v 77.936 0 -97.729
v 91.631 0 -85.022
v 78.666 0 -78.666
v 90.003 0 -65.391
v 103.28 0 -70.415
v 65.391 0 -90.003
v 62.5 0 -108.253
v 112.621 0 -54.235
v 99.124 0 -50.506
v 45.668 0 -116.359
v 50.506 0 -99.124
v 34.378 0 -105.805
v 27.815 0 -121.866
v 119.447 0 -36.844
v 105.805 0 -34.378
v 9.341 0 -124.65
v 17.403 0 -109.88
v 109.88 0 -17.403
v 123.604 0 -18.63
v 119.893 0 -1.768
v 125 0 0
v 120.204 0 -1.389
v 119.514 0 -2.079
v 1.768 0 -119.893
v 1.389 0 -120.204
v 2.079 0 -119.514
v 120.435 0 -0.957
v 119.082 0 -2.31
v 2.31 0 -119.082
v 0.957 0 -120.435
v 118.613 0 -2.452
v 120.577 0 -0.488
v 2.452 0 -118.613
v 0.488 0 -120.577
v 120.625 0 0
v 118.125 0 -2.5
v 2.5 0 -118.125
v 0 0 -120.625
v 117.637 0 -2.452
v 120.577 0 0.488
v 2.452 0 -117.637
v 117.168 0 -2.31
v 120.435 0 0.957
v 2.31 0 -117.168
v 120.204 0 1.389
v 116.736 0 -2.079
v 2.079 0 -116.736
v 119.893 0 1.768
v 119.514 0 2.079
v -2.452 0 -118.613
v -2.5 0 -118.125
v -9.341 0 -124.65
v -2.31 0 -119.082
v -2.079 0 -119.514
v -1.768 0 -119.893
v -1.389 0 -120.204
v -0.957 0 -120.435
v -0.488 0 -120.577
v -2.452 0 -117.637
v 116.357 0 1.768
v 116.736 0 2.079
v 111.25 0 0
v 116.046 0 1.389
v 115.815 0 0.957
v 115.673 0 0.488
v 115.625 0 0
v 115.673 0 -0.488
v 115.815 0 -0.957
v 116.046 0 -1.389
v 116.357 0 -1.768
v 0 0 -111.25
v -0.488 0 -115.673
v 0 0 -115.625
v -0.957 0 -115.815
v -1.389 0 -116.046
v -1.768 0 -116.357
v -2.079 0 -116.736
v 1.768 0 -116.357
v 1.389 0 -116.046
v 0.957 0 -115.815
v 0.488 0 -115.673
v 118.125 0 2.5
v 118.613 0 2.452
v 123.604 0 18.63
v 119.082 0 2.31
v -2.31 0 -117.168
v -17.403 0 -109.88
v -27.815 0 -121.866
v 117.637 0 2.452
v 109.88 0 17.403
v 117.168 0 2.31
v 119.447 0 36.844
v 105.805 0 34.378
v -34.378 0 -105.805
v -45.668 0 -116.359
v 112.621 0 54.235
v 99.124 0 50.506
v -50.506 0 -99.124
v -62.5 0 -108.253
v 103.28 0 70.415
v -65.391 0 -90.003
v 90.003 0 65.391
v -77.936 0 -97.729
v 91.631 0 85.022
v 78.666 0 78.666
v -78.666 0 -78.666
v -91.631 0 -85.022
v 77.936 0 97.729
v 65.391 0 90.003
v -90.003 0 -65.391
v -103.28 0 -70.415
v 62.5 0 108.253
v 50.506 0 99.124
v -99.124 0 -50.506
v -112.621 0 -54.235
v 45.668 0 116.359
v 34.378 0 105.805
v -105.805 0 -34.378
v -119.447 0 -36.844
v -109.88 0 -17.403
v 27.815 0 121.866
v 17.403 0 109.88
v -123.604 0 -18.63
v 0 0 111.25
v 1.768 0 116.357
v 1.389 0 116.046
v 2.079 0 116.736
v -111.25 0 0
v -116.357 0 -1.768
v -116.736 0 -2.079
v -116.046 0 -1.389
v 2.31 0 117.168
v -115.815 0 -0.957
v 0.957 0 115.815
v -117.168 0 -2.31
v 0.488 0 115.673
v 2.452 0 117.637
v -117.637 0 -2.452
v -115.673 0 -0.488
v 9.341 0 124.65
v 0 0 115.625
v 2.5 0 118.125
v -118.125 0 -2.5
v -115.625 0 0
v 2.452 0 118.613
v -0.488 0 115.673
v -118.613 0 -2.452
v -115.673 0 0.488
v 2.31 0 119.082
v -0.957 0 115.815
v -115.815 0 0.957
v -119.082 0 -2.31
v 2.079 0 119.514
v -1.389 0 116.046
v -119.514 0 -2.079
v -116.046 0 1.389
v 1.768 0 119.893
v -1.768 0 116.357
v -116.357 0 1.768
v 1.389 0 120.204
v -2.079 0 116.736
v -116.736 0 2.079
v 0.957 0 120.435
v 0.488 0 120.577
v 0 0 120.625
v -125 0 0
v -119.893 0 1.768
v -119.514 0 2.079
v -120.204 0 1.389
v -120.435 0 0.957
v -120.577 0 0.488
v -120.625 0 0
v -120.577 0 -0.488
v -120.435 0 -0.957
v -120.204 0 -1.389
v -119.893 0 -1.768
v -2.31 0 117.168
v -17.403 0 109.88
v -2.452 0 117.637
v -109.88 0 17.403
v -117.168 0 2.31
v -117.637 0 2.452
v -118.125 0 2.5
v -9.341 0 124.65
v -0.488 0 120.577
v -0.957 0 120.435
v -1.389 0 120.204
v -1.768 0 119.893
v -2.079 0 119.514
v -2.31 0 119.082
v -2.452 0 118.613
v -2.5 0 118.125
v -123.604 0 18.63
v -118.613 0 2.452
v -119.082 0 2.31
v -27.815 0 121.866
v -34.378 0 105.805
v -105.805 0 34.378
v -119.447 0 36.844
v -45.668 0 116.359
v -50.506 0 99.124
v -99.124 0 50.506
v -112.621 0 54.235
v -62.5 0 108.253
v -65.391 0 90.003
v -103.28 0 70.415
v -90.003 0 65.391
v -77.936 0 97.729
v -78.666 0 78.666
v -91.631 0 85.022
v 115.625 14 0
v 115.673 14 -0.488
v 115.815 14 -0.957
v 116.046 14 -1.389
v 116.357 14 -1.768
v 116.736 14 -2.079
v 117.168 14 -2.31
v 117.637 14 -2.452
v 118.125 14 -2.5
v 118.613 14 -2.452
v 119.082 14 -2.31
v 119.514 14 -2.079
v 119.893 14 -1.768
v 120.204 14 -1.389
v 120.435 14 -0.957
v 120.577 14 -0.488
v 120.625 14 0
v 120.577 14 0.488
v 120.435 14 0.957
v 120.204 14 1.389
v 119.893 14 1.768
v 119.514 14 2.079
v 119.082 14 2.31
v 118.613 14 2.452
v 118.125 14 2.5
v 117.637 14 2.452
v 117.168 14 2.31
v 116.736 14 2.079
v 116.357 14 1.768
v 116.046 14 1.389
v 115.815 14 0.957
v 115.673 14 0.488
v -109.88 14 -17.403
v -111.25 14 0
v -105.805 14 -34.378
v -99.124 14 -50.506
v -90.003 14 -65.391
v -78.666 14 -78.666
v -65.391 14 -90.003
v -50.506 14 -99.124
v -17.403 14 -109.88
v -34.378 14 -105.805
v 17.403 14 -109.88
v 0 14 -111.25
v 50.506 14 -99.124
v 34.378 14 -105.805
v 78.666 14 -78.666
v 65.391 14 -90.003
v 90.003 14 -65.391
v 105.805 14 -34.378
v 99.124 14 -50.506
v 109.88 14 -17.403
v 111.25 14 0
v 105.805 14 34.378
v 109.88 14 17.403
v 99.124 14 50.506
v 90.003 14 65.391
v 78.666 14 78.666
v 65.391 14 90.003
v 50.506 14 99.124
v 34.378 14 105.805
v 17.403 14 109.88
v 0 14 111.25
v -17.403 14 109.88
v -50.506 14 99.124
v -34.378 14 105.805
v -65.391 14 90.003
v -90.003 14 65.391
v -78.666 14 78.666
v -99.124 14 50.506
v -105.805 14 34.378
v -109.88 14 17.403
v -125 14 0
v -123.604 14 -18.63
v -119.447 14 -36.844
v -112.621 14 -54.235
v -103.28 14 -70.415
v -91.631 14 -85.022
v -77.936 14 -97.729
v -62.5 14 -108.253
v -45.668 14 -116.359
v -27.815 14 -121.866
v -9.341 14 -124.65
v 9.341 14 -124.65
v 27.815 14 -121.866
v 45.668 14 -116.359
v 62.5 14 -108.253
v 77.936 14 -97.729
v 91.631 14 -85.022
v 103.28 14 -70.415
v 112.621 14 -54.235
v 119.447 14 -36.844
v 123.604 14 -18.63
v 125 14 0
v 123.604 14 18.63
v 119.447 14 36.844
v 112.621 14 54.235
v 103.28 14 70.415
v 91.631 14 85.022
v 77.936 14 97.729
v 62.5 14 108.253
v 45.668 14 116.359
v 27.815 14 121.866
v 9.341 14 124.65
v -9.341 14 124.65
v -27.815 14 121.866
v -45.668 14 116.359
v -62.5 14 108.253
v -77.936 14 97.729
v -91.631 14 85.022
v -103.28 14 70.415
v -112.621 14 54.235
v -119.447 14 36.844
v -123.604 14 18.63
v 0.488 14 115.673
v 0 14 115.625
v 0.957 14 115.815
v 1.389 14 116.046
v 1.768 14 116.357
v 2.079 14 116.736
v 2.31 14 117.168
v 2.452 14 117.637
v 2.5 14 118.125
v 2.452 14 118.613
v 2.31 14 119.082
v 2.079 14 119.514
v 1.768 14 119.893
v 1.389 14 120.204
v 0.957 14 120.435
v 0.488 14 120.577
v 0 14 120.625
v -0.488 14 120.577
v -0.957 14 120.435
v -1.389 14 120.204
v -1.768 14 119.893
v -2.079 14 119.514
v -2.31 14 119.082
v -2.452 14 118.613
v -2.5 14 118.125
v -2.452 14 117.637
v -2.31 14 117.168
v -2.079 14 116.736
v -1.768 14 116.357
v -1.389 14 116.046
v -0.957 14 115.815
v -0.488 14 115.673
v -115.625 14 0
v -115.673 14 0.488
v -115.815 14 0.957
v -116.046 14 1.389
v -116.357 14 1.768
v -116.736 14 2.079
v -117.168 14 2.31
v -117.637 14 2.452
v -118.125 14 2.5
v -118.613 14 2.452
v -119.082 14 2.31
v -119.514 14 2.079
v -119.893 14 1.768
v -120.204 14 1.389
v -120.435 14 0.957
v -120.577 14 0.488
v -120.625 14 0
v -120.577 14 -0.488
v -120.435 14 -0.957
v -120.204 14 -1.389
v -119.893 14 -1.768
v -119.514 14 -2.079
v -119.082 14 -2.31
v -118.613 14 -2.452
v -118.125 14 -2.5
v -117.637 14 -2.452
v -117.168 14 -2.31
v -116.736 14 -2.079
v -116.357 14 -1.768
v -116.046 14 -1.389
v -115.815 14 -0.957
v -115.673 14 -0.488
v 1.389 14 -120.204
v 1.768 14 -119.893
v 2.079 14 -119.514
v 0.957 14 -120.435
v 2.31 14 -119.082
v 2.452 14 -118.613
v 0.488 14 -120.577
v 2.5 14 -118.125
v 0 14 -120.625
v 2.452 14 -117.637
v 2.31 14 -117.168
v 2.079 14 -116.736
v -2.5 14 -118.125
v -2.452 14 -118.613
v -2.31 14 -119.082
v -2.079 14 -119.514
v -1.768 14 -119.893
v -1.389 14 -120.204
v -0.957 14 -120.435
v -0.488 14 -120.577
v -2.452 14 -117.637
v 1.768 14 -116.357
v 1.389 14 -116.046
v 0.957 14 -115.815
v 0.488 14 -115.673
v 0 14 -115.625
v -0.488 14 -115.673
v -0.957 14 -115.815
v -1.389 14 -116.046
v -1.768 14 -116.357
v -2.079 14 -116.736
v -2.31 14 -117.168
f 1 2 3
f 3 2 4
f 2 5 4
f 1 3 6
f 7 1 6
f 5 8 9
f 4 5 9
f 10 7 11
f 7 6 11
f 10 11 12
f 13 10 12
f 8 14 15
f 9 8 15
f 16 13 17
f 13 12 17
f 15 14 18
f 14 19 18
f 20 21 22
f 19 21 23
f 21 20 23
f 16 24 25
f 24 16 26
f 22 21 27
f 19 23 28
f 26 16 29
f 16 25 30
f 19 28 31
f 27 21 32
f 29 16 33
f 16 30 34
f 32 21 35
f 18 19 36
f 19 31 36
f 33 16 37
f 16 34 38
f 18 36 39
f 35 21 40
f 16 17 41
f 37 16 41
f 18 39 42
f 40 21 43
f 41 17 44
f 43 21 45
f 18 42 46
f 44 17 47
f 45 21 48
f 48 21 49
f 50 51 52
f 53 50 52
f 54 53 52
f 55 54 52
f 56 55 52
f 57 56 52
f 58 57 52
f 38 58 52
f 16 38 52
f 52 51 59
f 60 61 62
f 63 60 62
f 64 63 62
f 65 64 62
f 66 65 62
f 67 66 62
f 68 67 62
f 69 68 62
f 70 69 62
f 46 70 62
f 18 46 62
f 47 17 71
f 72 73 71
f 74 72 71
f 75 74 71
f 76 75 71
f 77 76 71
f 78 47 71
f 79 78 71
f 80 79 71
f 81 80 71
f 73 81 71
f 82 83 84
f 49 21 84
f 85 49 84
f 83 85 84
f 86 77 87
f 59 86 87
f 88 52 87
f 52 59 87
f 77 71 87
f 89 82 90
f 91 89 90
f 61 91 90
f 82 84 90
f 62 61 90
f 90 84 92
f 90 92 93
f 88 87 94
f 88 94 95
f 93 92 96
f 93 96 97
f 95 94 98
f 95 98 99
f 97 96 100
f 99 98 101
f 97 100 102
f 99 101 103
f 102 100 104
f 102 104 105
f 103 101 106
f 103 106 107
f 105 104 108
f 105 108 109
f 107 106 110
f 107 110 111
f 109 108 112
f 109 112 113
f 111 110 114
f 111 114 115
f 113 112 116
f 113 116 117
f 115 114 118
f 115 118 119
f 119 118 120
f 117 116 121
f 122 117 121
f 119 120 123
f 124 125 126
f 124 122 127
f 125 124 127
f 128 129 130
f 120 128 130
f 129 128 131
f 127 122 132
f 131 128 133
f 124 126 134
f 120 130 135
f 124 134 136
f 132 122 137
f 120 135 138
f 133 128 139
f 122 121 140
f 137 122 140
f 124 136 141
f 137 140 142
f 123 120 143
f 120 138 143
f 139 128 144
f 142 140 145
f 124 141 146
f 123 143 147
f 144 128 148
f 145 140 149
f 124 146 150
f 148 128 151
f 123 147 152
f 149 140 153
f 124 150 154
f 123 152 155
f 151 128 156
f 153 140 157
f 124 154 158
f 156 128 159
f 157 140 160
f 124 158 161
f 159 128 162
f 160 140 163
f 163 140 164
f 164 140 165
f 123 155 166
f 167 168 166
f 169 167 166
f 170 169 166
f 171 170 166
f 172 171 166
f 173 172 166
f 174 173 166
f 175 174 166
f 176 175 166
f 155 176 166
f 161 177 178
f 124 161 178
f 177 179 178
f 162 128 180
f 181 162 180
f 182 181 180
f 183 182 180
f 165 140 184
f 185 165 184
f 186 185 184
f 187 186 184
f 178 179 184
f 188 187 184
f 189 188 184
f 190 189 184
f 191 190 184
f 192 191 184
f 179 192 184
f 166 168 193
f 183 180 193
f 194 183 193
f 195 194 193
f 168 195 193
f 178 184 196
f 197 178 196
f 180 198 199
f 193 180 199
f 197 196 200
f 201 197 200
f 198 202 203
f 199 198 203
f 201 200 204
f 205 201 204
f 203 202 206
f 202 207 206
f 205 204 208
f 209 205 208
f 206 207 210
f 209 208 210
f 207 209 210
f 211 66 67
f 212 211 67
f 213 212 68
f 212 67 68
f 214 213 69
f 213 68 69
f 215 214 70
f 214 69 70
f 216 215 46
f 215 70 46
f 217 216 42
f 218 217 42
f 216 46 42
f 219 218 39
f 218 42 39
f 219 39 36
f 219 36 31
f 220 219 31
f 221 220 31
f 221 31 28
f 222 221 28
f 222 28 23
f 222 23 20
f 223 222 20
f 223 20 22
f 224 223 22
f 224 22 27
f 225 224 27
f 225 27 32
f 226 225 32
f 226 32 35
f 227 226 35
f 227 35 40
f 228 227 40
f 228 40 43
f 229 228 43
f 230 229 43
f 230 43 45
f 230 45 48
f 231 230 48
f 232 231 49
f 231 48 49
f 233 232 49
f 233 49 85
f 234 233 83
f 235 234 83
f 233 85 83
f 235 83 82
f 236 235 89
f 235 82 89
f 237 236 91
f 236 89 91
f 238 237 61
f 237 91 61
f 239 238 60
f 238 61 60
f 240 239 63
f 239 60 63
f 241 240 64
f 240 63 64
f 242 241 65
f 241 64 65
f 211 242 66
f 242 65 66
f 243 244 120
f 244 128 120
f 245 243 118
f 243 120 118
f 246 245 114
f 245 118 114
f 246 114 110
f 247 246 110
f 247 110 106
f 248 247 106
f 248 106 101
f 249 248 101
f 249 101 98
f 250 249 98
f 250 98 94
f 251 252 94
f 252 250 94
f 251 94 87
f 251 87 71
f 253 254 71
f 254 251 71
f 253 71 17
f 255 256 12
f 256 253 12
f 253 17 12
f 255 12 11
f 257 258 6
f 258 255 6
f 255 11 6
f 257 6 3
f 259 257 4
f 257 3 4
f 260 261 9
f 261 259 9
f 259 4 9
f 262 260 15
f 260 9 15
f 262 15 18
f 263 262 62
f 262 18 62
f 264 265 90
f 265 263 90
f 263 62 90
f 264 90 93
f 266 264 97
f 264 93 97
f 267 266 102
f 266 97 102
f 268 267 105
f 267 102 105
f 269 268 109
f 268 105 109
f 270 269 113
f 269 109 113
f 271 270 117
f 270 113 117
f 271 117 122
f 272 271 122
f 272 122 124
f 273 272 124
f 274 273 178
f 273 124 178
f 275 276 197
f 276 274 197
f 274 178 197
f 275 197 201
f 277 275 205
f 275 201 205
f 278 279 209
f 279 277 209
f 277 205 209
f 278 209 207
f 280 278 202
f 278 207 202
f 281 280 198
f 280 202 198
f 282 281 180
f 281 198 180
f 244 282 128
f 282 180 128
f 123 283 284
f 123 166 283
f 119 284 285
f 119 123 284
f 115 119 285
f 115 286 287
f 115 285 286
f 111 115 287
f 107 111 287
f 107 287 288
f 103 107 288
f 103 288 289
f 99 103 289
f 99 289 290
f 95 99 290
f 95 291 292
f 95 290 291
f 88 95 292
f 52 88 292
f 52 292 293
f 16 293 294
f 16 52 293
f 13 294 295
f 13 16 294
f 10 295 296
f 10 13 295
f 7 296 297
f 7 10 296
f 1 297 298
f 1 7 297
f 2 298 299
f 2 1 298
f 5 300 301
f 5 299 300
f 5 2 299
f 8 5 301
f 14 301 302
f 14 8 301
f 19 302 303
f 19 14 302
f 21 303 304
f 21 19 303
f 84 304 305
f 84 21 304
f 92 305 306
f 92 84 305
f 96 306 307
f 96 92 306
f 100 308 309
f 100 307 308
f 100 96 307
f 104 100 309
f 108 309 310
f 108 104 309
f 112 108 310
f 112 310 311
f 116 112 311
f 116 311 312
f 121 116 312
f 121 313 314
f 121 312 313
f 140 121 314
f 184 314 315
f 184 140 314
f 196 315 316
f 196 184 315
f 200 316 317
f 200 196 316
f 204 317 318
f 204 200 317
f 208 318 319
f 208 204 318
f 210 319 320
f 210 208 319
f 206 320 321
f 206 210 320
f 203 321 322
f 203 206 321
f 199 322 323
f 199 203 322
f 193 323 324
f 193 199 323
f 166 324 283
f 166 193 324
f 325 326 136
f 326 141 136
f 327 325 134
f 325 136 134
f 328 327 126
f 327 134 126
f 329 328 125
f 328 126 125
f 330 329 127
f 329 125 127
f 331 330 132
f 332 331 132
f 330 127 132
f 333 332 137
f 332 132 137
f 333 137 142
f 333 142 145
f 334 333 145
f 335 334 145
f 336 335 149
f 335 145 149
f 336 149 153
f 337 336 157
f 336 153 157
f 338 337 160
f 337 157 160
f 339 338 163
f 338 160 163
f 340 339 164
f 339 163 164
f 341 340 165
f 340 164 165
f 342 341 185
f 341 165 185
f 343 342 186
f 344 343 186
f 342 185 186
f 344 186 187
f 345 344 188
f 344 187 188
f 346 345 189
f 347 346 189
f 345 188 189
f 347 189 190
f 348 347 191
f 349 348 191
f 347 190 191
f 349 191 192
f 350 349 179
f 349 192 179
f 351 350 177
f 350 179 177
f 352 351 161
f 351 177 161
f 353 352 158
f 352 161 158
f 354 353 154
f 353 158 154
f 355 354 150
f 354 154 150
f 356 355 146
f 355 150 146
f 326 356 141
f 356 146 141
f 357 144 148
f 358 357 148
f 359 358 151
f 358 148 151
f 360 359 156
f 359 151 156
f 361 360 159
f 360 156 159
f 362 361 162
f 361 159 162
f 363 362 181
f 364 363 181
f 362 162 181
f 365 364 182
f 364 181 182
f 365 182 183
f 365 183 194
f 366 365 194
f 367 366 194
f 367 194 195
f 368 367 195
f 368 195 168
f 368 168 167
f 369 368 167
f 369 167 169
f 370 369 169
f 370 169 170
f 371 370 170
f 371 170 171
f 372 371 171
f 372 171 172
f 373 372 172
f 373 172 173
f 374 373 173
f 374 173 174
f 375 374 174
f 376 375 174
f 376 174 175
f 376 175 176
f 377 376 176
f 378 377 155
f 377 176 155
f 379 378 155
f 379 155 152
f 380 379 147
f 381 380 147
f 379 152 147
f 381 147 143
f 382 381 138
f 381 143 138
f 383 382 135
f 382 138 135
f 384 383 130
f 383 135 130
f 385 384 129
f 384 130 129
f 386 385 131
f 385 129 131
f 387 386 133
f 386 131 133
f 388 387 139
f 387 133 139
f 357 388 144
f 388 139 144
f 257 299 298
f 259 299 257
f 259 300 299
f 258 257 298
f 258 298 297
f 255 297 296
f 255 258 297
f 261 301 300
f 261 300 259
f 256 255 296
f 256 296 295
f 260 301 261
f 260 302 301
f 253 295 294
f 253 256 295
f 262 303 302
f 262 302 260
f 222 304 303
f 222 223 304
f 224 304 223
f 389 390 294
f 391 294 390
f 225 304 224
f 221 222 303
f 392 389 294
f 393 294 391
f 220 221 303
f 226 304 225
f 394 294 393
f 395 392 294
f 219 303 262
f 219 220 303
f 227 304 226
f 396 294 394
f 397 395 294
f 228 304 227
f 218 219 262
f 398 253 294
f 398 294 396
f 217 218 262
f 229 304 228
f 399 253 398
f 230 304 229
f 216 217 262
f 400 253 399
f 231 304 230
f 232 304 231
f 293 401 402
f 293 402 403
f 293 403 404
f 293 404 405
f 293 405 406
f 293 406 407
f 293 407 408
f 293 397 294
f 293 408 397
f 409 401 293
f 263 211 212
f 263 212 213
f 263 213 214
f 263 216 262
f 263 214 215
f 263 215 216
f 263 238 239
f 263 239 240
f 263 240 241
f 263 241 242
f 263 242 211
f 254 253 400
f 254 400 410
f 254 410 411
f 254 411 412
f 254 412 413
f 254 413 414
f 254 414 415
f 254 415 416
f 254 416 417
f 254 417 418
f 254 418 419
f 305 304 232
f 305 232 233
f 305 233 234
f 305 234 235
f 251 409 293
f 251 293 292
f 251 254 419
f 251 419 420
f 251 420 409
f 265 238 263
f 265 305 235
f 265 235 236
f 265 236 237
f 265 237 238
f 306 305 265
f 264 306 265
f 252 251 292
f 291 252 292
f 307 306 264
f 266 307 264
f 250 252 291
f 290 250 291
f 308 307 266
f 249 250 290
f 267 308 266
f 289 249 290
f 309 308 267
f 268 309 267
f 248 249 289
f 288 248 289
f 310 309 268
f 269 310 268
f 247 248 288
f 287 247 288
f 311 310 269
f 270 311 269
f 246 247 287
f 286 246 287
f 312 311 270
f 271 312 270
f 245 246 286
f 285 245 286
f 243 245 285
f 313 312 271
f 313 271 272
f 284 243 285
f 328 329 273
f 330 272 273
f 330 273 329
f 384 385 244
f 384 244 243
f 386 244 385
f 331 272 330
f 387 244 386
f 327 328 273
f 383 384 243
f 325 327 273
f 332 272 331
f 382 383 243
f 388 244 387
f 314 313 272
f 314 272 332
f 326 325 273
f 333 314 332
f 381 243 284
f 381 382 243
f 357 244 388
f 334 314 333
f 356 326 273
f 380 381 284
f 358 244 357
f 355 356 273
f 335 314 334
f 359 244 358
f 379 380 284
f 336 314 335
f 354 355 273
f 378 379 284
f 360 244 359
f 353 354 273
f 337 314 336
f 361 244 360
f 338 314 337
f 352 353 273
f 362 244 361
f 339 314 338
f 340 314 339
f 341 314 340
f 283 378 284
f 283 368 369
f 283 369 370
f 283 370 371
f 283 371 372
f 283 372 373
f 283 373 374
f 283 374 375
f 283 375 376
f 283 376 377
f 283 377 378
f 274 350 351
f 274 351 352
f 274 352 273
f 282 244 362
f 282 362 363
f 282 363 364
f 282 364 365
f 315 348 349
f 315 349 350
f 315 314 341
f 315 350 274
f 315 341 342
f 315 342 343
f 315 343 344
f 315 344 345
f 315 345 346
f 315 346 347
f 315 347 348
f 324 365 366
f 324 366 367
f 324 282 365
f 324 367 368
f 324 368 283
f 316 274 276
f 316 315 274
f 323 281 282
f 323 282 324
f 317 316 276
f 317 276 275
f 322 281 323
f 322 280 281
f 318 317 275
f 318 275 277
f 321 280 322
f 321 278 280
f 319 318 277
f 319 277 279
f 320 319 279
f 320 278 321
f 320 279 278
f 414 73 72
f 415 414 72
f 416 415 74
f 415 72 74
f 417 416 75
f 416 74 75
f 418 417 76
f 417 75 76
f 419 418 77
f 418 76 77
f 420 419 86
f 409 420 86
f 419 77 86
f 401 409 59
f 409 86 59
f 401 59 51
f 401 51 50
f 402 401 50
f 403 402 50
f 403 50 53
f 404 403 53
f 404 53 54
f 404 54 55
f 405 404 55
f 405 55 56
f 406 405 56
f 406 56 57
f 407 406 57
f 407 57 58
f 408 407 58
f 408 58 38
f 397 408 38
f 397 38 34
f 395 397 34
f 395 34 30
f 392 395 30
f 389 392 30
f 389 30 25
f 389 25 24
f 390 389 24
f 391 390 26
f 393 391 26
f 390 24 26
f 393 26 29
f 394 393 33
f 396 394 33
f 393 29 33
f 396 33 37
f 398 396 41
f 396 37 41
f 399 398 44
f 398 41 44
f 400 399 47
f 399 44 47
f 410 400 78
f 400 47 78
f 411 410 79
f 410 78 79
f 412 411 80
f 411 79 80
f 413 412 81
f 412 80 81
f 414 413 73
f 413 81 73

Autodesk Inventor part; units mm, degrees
ref_plane "YZ Plane" through (0, 0, 0) normal (1, 0, 0) x (0, 1, 0)
ref_plane "XZ Plane" through (0, 0, 0) normal (0, 1, 0) x (-1, 0, 0)
ref_plane "XY Plane" through (0, 0, 0) normal (0, 0, 1) x (1, 0, 0)
sketch "Sketch1" plane through (0, 0, 0) normal (0, 1, 0) x (-1, 0, 0)
  circle A0 centre (0, 0) radius 125
  circle A1 centre (0, 0) radius 111.25
  dimension "d0" = 250
  dimension "d1" = 222.5
extrude "Extrusion1" add sketch "Sketch1" along normal blind 14
sketch "Sketch2" plane through (0, 14, 0) normal (0, 1, 0) x (1, 0, 0)
  circle A0 centre (0, 0) radius 118.125
  point P0 (0, 118.125)
  dimension "d4" = 236.25
hole "Hole1" at (0, 14, -118.125) direction (0, -1, 0) diameter 5 end through all
pattern_circular "Circular Pattern1" count 4 over 360 about axis through (0, -10, 0) along (0, 1, 0) of "Hole1"
sketch "Sketch3" plane through (0, 14, 0) normal (0, 1, 0) x (1, 0, 0)
  point P0 (0, 0)
properties part number "BearingTableGear"
